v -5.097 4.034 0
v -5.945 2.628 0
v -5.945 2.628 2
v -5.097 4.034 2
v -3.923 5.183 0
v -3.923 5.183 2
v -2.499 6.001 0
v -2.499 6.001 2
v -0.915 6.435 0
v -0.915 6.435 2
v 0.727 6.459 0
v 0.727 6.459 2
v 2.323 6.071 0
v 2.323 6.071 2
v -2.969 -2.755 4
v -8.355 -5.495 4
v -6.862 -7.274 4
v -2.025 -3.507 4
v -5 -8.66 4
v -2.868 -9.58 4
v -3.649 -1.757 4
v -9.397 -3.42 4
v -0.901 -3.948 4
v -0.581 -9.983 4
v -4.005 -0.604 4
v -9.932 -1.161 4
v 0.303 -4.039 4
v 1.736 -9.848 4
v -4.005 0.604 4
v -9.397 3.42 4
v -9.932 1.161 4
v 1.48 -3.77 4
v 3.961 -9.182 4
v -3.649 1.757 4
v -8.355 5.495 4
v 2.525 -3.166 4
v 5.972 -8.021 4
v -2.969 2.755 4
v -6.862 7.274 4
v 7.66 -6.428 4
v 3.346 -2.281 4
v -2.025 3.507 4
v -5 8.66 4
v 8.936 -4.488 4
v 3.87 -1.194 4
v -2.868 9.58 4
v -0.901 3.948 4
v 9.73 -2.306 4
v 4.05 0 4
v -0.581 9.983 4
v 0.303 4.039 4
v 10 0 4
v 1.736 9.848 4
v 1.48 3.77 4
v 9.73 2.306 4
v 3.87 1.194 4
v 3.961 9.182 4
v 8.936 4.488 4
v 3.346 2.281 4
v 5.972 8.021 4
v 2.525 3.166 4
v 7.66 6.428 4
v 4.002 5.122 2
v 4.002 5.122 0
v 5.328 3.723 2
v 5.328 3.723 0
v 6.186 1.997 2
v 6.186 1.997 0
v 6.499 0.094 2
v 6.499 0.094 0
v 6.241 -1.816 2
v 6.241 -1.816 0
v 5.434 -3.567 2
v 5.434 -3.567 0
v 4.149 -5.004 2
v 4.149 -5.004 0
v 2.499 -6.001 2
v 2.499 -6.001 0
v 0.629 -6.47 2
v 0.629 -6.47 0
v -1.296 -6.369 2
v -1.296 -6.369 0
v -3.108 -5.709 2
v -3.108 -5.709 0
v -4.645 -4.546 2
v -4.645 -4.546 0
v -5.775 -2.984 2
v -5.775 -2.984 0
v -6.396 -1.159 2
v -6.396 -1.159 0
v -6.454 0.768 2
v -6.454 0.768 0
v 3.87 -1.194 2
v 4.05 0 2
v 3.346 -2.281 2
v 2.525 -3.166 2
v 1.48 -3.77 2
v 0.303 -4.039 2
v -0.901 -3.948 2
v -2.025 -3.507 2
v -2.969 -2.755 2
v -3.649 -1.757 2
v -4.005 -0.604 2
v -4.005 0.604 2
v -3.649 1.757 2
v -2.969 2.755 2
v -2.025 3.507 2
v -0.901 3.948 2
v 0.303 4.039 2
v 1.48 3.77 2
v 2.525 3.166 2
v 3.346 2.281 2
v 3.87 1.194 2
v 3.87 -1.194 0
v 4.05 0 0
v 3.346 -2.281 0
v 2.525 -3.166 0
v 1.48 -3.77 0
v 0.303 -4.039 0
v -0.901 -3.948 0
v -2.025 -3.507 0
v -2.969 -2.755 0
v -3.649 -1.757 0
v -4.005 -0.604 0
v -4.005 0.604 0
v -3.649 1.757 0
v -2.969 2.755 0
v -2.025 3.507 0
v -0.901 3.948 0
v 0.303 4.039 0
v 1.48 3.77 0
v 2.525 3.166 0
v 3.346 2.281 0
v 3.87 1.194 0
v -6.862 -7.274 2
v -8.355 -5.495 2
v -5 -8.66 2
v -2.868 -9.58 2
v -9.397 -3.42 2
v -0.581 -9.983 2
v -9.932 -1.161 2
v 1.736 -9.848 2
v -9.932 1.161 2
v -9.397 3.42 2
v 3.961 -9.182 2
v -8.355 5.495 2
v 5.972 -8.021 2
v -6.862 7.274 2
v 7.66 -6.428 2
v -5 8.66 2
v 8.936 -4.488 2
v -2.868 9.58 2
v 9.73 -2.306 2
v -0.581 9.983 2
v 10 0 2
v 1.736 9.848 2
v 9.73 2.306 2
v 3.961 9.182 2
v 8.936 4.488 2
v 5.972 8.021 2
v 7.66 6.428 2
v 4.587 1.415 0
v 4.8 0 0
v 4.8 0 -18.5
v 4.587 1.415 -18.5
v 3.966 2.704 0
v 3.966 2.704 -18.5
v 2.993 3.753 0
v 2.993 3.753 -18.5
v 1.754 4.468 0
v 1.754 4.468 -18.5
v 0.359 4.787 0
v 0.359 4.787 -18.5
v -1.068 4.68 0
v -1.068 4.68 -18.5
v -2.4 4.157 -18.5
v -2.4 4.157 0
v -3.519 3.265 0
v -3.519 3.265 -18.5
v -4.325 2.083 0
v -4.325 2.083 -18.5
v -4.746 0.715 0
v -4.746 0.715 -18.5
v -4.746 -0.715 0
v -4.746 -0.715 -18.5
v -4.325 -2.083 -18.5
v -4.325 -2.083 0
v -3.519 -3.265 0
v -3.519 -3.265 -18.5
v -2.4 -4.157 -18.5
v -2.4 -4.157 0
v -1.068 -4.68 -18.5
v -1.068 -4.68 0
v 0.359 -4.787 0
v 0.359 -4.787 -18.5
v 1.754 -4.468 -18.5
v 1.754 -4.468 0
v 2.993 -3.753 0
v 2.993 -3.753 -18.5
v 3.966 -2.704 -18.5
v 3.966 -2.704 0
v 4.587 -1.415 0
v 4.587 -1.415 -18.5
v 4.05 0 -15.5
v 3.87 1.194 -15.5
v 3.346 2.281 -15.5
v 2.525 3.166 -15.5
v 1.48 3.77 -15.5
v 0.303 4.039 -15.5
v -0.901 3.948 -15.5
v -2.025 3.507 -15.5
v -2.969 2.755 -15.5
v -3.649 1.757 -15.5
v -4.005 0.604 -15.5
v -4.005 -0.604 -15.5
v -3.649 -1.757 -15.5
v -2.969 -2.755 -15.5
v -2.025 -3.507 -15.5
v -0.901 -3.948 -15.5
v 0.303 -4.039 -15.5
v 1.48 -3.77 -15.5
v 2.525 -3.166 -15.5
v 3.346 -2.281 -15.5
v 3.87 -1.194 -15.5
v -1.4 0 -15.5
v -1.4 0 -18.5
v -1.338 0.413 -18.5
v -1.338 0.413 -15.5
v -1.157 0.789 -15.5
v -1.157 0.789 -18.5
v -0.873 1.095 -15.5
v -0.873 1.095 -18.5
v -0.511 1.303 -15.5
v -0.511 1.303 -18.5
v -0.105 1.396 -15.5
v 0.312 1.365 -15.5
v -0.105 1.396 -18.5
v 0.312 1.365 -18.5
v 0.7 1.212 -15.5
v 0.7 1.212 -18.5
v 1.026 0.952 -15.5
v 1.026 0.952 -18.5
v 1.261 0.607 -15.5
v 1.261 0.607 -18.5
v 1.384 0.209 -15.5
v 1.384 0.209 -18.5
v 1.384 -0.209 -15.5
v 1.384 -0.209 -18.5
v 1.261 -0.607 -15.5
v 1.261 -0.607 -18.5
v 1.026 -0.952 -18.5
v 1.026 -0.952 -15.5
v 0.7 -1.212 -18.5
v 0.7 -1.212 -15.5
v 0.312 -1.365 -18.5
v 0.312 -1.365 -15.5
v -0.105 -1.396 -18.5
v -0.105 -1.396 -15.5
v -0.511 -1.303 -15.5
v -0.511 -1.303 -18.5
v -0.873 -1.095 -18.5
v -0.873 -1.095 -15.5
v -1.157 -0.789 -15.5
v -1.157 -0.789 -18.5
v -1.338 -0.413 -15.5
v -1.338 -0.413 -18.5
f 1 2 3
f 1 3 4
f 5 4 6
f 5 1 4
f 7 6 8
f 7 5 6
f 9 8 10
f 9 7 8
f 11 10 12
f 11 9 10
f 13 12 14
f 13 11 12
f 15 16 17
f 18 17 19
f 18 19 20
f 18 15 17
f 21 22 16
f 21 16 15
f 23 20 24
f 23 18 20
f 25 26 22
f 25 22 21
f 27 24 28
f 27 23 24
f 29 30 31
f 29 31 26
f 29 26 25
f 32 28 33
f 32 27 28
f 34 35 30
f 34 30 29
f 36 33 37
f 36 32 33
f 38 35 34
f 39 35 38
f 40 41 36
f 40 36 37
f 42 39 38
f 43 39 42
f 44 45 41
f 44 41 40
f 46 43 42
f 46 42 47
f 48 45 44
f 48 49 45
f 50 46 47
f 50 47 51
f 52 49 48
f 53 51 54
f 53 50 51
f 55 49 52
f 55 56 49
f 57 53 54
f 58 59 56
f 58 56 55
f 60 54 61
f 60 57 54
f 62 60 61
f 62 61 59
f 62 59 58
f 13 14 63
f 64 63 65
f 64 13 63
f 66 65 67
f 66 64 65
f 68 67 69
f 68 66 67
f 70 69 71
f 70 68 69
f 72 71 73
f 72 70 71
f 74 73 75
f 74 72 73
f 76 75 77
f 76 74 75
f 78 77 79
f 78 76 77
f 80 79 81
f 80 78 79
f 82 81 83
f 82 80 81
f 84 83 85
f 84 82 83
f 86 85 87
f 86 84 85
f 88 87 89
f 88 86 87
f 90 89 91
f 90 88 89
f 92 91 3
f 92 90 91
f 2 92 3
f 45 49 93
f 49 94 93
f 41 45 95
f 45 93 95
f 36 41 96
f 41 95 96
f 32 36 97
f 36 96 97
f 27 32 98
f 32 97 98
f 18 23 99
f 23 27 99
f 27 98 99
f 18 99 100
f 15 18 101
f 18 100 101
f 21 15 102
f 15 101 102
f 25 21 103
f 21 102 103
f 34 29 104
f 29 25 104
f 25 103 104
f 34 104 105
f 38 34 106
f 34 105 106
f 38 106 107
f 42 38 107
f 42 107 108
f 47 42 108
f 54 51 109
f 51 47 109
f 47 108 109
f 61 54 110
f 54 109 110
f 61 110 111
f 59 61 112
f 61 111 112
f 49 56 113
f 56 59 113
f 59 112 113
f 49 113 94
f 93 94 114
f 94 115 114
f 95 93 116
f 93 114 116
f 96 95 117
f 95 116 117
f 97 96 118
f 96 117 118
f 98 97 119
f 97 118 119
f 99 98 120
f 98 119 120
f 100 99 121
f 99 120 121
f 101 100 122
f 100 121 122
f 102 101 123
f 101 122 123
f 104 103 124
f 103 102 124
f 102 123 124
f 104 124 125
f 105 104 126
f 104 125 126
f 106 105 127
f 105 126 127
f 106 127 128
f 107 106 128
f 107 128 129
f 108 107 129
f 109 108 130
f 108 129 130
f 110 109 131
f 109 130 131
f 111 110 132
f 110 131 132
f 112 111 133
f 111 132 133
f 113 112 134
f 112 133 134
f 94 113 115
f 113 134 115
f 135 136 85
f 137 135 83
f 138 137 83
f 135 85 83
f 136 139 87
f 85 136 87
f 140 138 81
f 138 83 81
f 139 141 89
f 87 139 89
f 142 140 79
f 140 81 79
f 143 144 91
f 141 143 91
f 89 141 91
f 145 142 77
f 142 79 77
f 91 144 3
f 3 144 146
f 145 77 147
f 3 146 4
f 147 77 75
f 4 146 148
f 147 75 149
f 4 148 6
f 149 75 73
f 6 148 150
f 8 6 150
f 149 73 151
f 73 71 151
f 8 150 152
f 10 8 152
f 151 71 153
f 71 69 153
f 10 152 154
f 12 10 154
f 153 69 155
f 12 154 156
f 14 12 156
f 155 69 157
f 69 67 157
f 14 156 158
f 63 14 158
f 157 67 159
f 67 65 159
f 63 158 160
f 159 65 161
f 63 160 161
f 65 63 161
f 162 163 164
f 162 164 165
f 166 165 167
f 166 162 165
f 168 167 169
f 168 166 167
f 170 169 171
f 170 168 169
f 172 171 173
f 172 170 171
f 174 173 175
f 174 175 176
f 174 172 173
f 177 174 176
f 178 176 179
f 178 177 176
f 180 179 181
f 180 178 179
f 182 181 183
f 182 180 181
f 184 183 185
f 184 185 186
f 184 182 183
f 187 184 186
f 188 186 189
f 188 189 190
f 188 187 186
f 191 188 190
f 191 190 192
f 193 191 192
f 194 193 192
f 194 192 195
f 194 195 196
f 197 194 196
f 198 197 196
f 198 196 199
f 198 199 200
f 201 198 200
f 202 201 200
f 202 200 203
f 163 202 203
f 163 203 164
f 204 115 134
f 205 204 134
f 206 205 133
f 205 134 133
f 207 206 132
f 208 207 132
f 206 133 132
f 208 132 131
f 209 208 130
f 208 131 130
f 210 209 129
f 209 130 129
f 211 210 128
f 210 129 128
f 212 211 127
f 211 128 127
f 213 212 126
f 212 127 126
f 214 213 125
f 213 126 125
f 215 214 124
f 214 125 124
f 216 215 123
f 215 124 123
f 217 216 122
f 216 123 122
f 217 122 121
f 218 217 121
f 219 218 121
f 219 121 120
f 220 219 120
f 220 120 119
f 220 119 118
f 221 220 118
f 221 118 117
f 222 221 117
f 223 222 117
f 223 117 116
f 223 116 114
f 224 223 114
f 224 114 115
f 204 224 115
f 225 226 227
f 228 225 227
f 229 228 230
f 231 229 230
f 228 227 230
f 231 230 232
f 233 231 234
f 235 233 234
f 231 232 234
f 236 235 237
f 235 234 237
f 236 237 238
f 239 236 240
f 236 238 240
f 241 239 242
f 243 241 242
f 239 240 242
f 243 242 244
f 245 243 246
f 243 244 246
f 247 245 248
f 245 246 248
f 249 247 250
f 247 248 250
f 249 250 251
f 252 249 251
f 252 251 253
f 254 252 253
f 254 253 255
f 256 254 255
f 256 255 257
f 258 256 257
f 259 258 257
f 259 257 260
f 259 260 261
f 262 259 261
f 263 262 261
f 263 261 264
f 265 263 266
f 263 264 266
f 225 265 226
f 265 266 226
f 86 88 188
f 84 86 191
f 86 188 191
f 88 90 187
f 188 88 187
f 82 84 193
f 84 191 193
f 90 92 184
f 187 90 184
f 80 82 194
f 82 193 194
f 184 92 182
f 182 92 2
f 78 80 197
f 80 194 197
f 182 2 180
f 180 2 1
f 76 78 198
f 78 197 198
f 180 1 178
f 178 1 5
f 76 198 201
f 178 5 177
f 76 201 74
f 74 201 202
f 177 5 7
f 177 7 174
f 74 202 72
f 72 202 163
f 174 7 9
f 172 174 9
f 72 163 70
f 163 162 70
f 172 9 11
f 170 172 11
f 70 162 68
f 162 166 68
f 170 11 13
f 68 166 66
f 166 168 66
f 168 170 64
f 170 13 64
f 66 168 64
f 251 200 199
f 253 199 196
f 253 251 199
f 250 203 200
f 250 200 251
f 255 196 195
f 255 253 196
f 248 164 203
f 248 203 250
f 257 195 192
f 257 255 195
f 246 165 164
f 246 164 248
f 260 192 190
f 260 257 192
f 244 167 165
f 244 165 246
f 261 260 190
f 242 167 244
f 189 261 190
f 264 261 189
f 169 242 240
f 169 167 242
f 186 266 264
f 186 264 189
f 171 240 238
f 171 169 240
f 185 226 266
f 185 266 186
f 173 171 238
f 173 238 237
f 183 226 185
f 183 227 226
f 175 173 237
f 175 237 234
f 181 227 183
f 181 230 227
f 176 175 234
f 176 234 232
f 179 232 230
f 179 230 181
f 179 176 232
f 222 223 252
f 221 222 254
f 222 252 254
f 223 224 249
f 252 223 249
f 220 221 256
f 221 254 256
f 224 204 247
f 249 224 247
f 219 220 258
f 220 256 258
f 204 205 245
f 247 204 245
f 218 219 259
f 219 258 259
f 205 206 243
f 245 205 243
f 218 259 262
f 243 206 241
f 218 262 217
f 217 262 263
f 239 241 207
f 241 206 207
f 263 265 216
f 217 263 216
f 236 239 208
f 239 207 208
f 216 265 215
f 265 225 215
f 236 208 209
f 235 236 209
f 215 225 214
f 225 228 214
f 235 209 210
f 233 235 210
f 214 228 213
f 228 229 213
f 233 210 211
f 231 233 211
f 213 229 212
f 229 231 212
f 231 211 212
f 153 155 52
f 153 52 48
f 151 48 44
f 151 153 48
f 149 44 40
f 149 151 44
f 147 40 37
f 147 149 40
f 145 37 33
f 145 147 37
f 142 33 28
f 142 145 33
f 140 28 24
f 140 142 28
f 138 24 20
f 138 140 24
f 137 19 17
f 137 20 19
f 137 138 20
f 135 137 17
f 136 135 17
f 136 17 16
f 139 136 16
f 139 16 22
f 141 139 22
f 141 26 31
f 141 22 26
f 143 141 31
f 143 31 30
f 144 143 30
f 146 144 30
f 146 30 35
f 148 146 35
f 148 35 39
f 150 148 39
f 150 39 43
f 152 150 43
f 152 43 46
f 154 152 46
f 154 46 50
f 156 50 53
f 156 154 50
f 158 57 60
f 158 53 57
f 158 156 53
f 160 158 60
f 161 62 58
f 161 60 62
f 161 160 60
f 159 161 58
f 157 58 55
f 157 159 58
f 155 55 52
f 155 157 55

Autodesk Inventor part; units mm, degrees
ref_plane "YZ Plane" through (0, 0, 0) normal (1, 0, 0) x (0, 1, 0)
ref_plane "Arbeitsebene2" through (-24.4207, -24.3793, -13.5) normal (0, 0, -1) x (0, 1, 0)
ref_plane "Arbeitsebene3" through (-24.4207, -24.3793, -18.5) normal (0, 0, -1) x (0, 1, 0)
sketch "Skizze1" plane through (0, 0, 0) normal (0, 0, 1) x (1, 0, 0)
  arc A0 (-2.8009, 5.3061) -> (2.8009, 5.3061) centre (0, 0) ccw projected
  circle A1 centre (0, 0) radius 5 projected
  circle A2 centre (0, 0) radius 4.8
  circle A3 centre (0, 0) radius 4.05
  circle A4 centre (0, 0) radius 10
  point P0 (0, 0)
  dimension "d0" = 0.2
  dimension "d1" = 8.1
  dimension "d14" = 20
extrude "Extrusion1" add sketch "Skizze1" against normal up to surface (18.5 mm away) contours A2
sketch "Skizze2" plane through (0, 0, 0) normal (0, 0, 1) x (1, 0, 0)
  circle A0 centre (0, 0) radius 4.8 projected
  circle A1 centre (0, 0) radius 4.05 projected
  arc A2 (2.3233, 6.0706) -> (-5.9453, 2.6275) centre (0, 0) ccw projected
  circle A3 centre (0, 0) radius 6.5
  point P0 (-5.9453, 2.6275)
  point P1 (2.3233, 6.0706)
extrude "Extrusion2" add sketch "Skizze2" along normal blind 2 contours A0 | A3 A2
sketch "Skizze4" plane through (0, 0, -18.5) normal (0, 0, -1) x (-1, 0, 0)
  circle A0 centre (0, 0) radius 4.05 projected
  circle A1 centre (0, 0) radius 1.4
  point P0 (0, 0)
  dimension "d16" = 2.8
extrude "Extrusion4" add sketch "Skizze4" against normal blind 3
sketch "Skizze5" plane through (0, 0, 2) normal (0, 0, 1) x (1, 0, 0)
  circle A0 centre (0, 0) radius 6.5 projected
  circle A1 centre (0, 0) radius 6.5 projected
  circle A2 centre (0, 0) radius 4.05 projected
  circle A3 centre (0, 0) radius 10
  point P0 (0, 0)
  dimension "d19" = 20
extrude "Extrusion5" add sketch "Skizze5" along normal blind 2 contours A0 | A3
properties part number "50_ETL_Motionpart1_v0"
